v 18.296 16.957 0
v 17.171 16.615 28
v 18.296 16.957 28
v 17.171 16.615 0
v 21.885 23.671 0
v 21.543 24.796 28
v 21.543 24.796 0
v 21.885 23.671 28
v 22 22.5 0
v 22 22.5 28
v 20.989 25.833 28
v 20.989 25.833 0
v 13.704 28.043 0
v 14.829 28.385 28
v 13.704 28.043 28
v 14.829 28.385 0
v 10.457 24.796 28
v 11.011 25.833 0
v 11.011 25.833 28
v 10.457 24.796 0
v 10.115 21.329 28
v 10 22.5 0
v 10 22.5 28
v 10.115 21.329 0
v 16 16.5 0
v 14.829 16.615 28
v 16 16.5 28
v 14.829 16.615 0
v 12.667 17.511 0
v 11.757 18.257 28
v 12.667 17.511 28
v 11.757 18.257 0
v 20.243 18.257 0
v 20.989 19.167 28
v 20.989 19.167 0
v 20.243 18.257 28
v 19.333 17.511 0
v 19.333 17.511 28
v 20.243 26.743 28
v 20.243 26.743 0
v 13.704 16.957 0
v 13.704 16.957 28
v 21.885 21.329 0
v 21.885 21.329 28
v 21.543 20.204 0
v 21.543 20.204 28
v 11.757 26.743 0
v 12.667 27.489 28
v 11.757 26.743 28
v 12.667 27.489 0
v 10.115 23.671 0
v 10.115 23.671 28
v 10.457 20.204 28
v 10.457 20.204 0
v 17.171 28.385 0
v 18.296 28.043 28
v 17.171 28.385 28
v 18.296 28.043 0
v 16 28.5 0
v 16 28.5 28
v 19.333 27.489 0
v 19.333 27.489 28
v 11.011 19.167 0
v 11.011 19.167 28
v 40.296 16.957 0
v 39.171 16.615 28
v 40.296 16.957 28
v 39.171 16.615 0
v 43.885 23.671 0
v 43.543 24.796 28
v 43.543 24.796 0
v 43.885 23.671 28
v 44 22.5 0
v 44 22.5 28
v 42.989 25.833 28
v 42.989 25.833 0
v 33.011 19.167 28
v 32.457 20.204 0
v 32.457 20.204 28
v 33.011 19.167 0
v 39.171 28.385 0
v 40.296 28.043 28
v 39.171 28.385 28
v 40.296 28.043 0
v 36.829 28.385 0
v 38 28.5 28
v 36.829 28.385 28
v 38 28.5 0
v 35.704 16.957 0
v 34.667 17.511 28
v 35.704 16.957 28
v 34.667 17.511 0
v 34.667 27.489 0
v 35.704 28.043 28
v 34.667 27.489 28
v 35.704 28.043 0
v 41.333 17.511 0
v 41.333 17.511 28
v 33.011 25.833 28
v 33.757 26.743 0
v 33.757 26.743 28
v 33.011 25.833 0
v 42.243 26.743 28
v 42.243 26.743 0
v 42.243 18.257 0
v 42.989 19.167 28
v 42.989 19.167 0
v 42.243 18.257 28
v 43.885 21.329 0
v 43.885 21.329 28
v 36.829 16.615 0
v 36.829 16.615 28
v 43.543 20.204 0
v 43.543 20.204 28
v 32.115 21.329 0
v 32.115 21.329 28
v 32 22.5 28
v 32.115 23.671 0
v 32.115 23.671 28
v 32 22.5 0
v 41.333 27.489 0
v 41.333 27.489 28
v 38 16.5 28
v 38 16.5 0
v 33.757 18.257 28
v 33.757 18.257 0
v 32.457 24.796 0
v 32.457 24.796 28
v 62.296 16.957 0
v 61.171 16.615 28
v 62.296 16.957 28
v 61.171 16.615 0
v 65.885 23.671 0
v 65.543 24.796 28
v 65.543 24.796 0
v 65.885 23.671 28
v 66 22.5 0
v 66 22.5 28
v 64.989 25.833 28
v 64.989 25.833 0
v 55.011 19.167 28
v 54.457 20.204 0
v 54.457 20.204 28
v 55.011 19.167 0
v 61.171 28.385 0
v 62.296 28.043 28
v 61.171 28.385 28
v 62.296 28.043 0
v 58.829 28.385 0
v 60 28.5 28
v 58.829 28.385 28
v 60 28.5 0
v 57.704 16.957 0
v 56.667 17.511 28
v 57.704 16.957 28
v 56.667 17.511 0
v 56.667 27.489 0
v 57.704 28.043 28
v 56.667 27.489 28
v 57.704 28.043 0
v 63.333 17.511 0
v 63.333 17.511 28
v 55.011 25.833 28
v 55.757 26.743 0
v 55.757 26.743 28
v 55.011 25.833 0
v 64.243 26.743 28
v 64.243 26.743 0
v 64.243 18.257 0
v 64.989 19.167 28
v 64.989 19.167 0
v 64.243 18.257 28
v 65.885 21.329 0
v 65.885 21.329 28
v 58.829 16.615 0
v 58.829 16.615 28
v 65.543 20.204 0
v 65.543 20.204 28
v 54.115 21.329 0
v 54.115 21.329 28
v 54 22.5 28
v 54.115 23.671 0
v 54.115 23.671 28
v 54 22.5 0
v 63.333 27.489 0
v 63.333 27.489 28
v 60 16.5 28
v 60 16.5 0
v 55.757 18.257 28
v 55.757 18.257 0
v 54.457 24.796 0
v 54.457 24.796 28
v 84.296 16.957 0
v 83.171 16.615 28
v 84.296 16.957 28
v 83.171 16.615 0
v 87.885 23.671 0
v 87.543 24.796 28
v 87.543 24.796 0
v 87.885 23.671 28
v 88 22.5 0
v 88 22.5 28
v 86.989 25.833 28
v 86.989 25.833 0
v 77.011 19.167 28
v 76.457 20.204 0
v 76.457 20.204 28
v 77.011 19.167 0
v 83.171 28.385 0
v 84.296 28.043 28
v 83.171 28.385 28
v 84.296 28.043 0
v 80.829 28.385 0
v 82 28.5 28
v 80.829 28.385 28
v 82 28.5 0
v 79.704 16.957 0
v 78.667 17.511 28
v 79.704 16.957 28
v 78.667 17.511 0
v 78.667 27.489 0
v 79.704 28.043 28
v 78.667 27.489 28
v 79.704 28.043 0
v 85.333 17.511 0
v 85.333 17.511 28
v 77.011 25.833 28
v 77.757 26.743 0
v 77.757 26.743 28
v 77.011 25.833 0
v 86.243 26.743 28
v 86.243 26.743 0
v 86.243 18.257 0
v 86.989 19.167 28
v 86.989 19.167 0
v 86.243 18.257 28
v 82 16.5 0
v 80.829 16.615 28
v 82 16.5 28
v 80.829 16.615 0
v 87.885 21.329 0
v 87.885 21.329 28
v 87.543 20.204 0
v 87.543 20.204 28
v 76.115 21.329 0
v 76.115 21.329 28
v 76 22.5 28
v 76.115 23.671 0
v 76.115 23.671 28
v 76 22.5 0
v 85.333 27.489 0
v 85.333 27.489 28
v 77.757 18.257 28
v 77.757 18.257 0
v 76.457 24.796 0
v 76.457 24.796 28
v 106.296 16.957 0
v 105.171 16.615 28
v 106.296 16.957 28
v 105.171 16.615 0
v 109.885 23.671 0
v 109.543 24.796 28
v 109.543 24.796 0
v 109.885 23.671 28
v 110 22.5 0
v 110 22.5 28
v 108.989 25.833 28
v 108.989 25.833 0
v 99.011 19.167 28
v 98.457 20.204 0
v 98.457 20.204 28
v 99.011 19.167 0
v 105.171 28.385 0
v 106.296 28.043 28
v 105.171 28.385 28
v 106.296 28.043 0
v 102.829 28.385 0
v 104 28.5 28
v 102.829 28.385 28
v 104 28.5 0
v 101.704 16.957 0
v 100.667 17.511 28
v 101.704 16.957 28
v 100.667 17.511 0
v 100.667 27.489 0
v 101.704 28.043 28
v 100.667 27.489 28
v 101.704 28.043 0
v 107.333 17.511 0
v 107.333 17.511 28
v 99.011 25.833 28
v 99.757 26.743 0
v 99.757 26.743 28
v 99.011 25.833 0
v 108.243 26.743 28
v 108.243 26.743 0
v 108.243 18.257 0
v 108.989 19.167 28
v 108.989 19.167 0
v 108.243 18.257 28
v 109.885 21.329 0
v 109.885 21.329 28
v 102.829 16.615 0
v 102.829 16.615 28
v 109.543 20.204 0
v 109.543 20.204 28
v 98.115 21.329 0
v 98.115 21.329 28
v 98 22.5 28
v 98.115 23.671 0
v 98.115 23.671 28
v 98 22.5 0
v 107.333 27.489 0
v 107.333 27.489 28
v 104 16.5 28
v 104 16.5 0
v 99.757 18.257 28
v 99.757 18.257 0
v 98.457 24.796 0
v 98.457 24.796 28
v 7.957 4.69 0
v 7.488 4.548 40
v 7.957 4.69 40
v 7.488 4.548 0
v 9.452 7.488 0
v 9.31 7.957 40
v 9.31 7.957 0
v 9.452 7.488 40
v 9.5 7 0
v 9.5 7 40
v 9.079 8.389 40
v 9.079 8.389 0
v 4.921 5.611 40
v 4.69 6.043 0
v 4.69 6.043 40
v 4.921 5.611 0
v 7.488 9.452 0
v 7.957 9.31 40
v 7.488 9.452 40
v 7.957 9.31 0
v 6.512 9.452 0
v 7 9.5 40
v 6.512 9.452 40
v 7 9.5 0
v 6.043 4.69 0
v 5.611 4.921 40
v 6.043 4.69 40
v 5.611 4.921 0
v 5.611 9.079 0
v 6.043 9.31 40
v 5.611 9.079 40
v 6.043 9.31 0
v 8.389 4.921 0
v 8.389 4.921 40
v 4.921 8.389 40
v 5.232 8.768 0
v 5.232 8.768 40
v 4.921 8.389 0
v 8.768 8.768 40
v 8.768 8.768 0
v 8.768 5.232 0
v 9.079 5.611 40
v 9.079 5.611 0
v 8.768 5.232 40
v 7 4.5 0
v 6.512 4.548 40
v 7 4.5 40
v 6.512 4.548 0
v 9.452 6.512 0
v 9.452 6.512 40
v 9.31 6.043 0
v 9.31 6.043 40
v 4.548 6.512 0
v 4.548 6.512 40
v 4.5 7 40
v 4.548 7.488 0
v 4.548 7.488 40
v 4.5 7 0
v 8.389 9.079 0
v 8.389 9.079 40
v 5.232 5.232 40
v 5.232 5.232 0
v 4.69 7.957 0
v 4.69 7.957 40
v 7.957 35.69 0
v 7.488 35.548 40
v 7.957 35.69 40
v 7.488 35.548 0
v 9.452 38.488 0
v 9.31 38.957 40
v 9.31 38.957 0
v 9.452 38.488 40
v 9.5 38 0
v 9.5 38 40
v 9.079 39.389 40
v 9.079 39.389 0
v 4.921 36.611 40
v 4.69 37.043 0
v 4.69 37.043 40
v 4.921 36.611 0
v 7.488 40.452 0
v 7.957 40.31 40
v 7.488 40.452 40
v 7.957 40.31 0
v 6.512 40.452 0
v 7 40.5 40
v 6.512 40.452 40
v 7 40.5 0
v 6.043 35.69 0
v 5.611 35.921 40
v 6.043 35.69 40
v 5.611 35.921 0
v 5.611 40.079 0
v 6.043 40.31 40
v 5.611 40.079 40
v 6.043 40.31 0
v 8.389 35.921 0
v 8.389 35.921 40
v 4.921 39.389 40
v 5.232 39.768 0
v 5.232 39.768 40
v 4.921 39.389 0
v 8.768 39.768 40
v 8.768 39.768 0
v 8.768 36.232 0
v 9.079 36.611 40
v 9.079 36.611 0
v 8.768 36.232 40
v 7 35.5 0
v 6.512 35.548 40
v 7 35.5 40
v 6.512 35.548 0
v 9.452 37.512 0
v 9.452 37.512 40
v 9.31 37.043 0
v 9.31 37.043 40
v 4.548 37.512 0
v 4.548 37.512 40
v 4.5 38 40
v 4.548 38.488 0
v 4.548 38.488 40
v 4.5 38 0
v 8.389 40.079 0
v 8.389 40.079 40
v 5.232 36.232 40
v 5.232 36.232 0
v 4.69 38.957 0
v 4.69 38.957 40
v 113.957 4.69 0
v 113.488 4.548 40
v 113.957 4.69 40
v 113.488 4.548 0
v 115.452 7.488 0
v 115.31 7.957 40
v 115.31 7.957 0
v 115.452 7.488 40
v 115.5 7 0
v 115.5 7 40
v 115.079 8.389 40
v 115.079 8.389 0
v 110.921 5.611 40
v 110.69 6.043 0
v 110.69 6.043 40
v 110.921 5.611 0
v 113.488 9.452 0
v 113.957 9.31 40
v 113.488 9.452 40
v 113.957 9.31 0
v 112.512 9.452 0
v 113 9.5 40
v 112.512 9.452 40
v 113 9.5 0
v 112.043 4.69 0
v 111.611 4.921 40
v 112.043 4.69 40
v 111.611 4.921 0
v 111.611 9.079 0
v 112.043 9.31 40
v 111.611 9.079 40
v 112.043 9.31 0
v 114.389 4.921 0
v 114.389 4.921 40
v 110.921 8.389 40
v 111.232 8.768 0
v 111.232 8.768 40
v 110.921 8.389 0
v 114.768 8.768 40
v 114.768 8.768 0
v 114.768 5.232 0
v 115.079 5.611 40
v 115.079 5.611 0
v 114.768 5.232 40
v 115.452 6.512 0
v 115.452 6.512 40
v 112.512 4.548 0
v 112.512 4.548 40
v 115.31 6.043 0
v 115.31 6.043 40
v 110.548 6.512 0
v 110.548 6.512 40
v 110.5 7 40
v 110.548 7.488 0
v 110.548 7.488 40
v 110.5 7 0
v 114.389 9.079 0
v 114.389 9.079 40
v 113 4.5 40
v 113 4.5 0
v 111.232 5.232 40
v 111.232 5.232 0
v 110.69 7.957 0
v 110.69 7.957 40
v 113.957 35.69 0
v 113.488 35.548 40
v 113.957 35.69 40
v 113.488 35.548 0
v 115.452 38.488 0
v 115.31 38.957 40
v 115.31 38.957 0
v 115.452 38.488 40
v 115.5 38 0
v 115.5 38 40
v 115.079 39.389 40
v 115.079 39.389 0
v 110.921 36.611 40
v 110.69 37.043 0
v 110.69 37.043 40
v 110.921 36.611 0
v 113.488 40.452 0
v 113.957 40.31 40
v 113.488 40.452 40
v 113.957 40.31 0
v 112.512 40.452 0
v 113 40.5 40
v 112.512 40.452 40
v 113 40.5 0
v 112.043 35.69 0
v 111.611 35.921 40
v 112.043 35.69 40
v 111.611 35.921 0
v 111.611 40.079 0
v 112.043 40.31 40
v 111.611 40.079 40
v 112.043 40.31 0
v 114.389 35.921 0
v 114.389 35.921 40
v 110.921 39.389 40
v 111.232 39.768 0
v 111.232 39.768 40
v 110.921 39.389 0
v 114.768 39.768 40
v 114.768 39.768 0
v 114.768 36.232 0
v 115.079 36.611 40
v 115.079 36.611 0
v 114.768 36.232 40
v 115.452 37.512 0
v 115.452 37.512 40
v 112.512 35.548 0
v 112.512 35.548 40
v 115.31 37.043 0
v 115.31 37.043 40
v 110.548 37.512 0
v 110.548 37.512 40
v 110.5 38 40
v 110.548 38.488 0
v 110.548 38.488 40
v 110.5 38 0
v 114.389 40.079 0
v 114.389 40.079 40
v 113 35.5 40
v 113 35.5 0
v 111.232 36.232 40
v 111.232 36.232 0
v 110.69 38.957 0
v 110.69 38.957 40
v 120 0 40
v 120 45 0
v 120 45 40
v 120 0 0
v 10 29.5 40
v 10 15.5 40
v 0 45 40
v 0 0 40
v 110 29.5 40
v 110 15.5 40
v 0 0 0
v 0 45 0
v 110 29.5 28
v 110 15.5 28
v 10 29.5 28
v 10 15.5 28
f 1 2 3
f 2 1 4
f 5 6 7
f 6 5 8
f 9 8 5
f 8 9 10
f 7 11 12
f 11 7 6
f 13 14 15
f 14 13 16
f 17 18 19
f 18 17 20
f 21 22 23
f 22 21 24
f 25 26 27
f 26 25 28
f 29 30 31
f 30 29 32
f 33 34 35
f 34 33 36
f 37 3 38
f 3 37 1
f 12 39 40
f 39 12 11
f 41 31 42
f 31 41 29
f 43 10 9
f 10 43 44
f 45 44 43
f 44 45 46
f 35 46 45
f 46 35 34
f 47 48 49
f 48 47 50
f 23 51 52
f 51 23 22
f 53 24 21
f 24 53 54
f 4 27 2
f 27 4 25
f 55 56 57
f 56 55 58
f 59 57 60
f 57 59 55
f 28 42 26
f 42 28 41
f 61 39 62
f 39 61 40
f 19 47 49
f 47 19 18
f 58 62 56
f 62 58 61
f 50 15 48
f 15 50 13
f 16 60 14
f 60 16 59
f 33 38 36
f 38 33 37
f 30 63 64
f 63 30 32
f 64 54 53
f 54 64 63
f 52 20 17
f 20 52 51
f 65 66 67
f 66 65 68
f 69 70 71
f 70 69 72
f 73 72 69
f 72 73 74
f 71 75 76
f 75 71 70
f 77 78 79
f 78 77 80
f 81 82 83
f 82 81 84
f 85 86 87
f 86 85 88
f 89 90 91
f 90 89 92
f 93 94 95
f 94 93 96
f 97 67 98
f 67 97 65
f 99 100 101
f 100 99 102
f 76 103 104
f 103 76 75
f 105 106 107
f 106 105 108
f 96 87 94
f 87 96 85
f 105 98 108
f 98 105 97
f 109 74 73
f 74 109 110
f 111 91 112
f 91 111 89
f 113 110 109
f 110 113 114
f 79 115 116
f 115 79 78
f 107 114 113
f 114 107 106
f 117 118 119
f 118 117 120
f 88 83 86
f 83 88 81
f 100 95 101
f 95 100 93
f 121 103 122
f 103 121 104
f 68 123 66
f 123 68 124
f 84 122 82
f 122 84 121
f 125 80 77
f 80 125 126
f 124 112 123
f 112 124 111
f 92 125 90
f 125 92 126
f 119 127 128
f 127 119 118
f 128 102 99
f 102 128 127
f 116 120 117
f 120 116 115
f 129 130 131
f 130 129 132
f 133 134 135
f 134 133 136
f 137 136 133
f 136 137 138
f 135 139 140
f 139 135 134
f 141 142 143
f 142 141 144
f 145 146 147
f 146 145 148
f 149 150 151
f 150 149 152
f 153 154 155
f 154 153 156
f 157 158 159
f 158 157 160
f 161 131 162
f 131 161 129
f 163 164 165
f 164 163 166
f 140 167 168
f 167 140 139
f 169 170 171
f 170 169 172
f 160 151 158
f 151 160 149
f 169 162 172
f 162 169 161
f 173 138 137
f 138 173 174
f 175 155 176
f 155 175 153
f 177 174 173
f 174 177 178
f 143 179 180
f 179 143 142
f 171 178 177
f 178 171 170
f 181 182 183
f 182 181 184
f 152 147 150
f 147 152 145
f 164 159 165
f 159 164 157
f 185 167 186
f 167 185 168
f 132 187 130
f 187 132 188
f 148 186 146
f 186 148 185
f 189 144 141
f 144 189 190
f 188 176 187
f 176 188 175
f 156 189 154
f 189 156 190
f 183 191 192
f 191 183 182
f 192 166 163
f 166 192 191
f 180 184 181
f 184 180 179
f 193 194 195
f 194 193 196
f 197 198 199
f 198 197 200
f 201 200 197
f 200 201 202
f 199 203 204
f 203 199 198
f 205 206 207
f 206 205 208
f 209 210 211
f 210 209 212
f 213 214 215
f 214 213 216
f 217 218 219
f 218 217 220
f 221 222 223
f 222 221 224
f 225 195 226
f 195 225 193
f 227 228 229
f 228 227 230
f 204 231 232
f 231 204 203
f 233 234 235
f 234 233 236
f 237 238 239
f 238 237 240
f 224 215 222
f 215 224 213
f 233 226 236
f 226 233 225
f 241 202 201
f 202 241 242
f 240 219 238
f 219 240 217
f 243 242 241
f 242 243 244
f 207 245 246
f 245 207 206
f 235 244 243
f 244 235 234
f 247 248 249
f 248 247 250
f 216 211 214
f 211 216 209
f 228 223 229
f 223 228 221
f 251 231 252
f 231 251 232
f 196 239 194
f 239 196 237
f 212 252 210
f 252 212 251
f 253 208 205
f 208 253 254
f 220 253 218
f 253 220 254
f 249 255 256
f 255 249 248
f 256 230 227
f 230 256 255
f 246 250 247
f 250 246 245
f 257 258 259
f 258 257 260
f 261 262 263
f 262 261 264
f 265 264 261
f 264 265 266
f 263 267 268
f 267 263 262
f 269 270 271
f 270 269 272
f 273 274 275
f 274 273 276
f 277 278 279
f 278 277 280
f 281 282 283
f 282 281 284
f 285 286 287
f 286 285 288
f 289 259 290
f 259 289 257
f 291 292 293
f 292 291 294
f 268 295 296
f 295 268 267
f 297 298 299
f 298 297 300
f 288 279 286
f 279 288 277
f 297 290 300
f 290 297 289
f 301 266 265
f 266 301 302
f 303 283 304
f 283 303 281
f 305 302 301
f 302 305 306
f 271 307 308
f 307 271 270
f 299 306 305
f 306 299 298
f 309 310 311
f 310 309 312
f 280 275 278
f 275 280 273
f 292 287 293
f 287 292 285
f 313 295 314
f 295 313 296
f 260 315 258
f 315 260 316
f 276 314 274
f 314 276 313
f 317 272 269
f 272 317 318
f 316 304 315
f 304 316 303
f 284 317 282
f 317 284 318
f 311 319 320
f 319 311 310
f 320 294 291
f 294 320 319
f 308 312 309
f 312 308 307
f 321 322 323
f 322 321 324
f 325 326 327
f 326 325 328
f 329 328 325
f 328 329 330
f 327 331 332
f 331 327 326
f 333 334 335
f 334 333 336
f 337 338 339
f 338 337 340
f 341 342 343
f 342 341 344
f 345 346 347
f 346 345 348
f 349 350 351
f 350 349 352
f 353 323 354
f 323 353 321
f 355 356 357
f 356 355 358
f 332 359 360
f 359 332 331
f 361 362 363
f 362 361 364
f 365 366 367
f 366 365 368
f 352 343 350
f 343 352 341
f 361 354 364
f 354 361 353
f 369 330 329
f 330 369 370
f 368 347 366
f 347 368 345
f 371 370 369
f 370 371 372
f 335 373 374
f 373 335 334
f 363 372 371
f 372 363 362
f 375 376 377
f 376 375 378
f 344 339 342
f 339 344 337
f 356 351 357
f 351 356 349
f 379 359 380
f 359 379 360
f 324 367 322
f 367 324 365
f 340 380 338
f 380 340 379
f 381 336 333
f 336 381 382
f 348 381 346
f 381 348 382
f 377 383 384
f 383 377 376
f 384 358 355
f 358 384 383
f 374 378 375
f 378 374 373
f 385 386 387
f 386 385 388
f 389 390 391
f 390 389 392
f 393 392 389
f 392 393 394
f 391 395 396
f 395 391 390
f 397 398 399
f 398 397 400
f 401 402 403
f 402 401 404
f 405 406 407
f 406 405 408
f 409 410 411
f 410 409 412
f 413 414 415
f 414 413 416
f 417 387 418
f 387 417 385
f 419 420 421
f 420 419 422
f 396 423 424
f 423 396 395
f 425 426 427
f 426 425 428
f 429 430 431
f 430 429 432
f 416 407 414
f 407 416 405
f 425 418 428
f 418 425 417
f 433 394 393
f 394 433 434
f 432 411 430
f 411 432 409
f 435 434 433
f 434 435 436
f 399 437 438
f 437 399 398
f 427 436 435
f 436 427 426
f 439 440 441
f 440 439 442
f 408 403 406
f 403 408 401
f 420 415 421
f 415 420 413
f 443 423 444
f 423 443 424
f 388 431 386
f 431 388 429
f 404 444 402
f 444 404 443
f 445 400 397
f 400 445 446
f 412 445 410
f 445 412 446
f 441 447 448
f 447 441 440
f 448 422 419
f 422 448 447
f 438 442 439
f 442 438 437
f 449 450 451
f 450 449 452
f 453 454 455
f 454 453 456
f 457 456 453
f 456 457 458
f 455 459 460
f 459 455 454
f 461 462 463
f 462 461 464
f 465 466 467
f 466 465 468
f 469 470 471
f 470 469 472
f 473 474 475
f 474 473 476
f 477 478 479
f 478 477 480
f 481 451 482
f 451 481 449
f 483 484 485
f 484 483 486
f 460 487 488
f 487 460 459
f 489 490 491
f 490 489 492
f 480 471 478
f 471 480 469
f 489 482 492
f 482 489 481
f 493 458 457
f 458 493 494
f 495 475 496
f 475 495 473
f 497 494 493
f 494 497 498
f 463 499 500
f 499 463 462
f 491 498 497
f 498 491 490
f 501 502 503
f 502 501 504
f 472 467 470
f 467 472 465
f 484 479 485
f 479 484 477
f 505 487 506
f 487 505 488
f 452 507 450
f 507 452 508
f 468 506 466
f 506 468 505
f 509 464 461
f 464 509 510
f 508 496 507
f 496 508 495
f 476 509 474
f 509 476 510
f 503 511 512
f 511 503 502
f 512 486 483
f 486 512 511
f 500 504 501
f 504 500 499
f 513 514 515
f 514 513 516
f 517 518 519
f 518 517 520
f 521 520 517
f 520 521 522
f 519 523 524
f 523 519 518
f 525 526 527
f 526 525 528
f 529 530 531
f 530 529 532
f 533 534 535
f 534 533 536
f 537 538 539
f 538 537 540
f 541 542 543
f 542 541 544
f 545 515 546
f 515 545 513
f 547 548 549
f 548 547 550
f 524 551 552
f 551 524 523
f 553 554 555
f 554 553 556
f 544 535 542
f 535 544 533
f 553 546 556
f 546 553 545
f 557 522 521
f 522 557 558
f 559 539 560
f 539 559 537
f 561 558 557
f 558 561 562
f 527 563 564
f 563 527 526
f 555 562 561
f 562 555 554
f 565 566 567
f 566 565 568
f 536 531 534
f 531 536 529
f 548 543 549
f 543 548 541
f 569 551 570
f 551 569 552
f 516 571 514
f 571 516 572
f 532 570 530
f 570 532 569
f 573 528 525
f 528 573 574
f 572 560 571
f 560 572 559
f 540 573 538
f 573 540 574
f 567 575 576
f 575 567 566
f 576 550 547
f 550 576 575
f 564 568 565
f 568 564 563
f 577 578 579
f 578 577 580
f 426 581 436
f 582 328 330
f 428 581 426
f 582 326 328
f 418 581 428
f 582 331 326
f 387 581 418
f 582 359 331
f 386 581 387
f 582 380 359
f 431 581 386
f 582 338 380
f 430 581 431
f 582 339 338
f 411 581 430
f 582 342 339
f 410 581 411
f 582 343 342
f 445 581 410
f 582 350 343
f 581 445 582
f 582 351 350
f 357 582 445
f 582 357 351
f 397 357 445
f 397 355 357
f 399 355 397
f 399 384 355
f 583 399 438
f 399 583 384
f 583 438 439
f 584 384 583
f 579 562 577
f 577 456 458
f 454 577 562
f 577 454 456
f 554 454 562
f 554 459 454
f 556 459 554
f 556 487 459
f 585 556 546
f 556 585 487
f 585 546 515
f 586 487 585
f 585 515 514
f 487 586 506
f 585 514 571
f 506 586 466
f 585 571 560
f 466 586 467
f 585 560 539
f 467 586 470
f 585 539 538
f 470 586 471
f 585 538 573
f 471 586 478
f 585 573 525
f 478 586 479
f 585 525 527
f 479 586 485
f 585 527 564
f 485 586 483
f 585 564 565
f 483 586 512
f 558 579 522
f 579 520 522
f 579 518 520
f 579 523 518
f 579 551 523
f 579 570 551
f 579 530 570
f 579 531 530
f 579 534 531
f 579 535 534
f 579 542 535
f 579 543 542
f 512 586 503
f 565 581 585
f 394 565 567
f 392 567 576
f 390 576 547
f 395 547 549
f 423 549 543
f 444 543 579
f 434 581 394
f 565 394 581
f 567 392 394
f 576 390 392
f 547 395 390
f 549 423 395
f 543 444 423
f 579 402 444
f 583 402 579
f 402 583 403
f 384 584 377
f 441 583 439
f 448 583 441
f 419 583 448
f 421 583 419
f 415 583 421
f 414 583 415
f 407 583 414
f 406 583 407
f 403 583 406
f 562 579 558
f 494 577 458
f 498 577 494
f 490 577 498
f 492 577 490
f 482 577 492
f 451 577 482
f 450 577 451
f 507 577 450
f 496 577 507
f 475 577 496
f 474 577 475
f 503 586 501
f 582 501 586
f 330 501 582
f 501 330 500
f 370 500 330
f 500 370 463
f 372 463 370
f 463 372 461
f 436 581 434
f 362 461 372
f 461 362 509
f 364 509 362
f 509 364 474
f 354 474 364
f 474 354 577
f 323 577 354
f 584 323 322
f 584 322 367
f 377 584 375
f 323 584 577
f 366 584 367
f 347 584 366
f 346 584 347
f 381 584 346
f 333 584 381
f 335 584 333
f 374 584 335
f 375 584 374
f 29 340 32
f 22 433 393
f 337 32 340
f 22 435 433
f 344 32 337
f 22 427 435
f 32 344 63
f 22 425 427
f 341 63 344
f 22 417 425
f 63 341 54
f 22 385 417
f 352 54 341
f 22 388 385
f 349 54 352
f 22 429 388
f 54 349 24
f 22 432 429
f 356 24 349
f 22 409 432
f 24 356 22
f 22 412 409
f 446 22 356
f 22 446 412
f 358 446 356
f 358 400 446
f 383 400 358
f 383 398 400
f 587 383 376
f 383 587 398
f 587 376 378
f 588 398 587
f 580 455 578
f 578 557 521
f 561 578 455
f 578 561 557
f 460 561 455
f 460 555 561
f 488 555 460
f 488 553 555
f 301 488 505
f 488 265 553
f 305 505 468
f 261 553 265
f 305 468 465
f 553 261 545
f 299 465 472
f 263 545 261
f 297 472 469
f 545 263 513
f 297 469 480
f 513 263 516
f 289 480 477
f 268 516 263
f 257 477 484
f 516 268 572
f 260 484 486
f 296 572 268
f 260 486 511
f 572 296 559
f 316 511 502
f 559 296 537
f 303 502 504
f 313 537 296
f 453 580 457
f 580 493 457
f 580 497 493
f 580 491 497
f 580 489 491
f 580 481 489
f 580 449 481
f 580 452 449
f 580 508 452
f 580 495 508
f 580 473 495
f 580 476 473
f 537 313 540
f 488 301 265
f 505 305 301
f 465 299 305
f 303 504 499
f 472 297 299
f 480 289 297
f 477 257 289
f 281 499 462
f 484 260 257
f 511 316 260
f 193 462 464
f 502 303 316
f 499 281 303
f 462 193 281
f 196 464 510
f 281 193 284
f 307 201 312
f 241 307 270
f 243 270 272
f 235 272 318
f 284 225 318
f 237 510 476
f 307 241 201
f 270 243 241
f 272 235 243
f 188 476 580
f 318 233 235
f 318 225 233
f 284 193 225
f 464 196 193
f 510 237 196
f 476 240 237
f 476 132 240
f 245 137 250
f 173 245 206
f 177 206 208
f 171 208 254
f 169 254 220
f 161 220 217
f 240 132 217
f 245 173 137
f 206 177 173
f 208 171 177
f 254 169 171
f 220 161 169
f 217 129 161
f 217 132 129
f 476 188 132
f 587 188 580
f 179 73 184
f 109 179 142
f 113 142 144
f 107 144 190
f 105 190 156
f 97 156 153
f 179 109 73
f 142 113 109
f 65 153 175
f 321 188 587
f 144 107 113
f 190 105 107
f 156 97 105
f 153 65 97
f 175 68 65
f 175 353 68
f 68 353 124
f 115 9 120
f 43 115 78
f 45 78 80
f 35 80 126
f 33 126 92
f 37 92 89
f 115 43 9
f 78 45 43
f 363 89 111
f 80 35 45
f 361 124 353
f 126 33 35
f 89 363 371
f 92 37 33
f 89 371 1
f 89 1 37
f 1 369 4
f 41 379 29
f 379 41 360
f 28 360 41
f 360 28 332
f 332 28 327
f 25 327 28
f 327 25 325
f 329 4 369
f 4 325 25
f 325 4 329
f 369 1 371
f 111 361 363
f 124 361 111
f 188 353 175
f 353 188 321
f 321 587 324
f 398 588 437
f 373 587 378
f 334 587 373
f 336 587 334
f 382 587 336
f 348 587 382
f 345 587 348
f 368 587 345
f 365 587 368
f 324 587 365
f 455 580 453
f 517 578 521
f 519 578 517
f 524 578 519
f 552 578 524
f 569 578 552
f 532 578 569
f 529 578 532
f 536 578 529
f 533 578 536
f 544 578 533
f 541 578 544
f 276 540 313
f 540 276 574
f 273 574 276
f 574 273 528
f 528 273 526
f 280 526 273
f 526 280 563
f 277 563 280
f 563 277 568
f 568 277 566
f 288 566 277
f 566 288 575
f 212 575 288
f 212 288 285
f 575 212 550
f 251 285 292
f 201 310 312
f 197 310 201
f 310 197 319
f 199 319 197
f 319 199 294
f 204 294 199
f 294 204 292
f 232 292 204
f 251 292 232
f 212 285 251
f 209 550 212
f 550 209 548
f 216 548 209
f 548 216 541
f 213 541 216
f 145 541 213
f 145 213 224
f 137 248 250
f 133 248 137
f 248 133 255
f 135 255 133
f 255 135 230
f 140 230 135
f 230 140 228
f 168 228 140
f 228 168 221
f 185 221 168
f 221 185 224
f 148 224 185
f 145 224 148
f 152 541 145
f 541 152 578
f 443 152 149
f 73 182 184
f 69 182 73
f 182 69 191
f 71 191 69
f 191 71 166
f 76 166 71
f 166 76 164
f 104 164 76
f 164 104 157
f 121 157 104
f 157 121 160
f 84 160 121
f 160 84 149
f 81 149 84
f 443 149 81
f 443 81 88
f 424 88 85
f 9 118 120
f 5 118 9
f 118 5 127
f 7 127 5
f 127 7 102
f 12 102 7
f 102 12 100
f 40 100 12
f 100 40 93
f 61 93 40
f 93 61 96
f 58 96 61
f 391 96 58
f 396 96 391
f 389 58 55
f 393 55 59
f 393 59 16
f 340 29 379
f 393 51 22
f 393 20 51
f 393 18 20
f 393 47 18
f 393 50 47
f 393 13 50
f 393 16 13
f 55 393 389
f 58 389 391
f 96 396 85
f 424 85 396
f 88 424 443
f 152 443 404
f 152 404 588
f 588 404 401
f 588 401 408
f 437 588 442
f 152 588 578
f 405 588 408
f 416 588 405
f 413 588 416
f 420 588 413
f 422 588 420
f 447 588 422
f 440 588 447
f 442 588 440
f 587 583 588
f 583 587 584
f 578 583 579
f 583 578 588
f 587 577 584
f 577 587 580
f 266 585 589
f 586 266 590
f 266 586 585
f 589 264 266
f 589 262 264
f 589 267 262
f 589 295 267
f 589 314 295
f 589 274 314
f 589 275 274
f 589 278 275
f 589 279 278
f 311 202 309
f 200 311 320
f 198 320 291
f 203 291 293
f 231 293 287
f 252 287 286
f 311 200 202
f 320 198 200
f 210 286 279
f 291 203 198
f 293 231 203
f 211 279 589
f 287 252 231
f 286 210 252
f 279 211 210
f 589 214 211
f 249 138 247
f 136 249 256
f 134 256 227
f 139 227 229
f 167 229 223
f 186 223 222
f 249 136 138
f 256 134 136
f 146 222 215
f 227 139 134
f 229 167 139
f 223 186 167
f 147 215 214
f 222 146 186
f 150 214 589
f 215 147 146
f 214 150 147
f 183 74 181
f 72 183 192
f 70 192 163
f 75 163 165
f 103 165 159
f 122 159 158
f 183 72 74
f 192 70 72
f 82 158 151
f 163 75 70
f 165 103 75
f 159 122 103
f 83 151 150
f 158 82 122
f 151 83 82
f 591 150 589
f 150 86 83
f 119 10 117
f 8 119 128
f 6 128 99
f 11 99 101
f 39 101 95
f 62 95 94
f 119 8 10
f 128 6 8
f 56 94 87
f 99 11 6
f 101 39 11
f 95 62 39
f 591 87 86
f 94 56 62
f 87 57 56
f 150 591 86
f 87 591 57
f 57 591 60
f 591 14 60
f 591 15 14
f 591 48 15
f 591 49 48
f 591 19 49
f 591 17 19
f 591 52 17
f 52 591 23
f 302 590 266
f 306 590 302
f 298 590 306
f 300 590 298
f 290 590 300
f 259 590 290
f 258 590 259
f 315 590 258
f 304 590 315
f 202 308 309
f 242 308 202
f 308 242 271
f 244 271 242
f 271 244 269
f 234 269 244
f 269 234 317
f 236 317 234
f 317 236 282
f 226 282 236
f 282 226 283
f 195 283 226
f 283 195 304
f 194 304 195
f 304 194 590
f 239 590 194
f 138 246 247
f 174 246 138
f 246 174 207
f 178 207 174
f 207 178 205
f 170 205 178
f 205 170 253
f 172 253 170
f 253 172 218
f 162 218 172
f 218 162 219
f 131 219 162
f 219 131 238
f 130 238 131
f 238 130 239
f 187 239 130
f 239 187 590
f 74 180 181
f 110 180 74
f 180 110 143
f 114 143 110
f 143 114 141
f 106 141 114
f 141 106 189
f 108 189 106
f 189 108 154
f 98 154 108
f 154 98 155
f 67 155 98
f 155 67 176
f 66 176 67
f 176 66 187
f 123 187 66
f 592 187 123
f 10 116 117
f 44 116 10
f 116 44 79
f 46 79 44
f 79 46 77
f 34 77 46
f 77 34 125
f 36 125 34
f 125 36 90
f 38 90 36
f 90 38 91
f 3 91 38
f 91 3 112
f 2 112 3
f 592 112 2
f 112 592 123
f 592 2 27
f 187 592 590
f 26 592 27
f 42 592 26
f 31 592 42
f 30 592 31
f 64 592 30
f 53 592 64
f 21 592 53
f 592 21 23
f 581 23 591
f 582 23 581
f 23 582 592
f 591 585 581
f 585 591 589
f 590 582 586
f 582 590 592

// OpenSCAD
$fn = 32;

// ----------------------------------------------------------------------
// Manifold block: gallery_top manifold
// ----------------------------------------------------------------------

// --- parameters (mm) ---
block_l = 120;            // block length, X
block_w = 45;             // block width, Y
block_h = 40;             // block height, Z
port_d = 12;              // port bore diameter
port_pitch = 22;          // port pitch along X
gallery_d = 14;           // top gallery width, Y
gallery_depth = 12;       // gallery pocket depth
wall_p = 10;              // gallery end wall thickness, X
mnt_d = 5;                // mounting hole diameter
mnt_in = 7;               // mounting hole inset from the edges

n_ports = 5;  // ports in the row
port_x0 = (block_l - (n_ports - 1) * port_pitch) / 2;  // first port X

difference() {
  cube([block_l, block_w, block_h]);
  for (i = [0 : n_ports - 1])
    translate([port_x0 + i * port_pitch, block_w / 2, -1])
      cylinder(h = block_h + 2, d = port_d);
  translate([wall_p, block_w / 2 - gallery_d / 2, block_h - gallery_depth])
    cube([block_l - 2 * wall_p, gallery_d, gallery_depth + 1]);
  for (cx = [mnt_in, block_l - mnt_in])
    for (cy = [mnt_in, block_w - mnt_in])
      translate([cx, cy, -1]) cylinder(h = block_h + 2, d = mnt_d);
}
